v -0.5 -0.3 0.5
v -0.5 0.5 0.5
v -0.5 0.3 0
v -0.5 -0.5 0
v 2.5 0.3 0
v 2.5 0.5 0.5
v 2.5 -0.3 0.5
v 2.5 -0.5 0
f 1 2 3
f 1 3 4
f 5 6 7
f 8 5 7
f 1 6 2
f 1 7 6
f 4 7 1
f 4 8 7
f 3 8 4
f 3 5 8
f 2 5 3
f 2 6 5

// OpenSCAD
// Parallelogram Prism for Stacks of Shapes
// by Slashee the Cow

points = [
    [0,0],
    [0.8,0],
    [1,0.5],
    [0.2,0.5]
    ];

color("orchid")
translate([-0.5,-0.5,0])
rotate([90,0,90])
linear_extrude(3)
polygon(points, [[3,2,1,0]]);
